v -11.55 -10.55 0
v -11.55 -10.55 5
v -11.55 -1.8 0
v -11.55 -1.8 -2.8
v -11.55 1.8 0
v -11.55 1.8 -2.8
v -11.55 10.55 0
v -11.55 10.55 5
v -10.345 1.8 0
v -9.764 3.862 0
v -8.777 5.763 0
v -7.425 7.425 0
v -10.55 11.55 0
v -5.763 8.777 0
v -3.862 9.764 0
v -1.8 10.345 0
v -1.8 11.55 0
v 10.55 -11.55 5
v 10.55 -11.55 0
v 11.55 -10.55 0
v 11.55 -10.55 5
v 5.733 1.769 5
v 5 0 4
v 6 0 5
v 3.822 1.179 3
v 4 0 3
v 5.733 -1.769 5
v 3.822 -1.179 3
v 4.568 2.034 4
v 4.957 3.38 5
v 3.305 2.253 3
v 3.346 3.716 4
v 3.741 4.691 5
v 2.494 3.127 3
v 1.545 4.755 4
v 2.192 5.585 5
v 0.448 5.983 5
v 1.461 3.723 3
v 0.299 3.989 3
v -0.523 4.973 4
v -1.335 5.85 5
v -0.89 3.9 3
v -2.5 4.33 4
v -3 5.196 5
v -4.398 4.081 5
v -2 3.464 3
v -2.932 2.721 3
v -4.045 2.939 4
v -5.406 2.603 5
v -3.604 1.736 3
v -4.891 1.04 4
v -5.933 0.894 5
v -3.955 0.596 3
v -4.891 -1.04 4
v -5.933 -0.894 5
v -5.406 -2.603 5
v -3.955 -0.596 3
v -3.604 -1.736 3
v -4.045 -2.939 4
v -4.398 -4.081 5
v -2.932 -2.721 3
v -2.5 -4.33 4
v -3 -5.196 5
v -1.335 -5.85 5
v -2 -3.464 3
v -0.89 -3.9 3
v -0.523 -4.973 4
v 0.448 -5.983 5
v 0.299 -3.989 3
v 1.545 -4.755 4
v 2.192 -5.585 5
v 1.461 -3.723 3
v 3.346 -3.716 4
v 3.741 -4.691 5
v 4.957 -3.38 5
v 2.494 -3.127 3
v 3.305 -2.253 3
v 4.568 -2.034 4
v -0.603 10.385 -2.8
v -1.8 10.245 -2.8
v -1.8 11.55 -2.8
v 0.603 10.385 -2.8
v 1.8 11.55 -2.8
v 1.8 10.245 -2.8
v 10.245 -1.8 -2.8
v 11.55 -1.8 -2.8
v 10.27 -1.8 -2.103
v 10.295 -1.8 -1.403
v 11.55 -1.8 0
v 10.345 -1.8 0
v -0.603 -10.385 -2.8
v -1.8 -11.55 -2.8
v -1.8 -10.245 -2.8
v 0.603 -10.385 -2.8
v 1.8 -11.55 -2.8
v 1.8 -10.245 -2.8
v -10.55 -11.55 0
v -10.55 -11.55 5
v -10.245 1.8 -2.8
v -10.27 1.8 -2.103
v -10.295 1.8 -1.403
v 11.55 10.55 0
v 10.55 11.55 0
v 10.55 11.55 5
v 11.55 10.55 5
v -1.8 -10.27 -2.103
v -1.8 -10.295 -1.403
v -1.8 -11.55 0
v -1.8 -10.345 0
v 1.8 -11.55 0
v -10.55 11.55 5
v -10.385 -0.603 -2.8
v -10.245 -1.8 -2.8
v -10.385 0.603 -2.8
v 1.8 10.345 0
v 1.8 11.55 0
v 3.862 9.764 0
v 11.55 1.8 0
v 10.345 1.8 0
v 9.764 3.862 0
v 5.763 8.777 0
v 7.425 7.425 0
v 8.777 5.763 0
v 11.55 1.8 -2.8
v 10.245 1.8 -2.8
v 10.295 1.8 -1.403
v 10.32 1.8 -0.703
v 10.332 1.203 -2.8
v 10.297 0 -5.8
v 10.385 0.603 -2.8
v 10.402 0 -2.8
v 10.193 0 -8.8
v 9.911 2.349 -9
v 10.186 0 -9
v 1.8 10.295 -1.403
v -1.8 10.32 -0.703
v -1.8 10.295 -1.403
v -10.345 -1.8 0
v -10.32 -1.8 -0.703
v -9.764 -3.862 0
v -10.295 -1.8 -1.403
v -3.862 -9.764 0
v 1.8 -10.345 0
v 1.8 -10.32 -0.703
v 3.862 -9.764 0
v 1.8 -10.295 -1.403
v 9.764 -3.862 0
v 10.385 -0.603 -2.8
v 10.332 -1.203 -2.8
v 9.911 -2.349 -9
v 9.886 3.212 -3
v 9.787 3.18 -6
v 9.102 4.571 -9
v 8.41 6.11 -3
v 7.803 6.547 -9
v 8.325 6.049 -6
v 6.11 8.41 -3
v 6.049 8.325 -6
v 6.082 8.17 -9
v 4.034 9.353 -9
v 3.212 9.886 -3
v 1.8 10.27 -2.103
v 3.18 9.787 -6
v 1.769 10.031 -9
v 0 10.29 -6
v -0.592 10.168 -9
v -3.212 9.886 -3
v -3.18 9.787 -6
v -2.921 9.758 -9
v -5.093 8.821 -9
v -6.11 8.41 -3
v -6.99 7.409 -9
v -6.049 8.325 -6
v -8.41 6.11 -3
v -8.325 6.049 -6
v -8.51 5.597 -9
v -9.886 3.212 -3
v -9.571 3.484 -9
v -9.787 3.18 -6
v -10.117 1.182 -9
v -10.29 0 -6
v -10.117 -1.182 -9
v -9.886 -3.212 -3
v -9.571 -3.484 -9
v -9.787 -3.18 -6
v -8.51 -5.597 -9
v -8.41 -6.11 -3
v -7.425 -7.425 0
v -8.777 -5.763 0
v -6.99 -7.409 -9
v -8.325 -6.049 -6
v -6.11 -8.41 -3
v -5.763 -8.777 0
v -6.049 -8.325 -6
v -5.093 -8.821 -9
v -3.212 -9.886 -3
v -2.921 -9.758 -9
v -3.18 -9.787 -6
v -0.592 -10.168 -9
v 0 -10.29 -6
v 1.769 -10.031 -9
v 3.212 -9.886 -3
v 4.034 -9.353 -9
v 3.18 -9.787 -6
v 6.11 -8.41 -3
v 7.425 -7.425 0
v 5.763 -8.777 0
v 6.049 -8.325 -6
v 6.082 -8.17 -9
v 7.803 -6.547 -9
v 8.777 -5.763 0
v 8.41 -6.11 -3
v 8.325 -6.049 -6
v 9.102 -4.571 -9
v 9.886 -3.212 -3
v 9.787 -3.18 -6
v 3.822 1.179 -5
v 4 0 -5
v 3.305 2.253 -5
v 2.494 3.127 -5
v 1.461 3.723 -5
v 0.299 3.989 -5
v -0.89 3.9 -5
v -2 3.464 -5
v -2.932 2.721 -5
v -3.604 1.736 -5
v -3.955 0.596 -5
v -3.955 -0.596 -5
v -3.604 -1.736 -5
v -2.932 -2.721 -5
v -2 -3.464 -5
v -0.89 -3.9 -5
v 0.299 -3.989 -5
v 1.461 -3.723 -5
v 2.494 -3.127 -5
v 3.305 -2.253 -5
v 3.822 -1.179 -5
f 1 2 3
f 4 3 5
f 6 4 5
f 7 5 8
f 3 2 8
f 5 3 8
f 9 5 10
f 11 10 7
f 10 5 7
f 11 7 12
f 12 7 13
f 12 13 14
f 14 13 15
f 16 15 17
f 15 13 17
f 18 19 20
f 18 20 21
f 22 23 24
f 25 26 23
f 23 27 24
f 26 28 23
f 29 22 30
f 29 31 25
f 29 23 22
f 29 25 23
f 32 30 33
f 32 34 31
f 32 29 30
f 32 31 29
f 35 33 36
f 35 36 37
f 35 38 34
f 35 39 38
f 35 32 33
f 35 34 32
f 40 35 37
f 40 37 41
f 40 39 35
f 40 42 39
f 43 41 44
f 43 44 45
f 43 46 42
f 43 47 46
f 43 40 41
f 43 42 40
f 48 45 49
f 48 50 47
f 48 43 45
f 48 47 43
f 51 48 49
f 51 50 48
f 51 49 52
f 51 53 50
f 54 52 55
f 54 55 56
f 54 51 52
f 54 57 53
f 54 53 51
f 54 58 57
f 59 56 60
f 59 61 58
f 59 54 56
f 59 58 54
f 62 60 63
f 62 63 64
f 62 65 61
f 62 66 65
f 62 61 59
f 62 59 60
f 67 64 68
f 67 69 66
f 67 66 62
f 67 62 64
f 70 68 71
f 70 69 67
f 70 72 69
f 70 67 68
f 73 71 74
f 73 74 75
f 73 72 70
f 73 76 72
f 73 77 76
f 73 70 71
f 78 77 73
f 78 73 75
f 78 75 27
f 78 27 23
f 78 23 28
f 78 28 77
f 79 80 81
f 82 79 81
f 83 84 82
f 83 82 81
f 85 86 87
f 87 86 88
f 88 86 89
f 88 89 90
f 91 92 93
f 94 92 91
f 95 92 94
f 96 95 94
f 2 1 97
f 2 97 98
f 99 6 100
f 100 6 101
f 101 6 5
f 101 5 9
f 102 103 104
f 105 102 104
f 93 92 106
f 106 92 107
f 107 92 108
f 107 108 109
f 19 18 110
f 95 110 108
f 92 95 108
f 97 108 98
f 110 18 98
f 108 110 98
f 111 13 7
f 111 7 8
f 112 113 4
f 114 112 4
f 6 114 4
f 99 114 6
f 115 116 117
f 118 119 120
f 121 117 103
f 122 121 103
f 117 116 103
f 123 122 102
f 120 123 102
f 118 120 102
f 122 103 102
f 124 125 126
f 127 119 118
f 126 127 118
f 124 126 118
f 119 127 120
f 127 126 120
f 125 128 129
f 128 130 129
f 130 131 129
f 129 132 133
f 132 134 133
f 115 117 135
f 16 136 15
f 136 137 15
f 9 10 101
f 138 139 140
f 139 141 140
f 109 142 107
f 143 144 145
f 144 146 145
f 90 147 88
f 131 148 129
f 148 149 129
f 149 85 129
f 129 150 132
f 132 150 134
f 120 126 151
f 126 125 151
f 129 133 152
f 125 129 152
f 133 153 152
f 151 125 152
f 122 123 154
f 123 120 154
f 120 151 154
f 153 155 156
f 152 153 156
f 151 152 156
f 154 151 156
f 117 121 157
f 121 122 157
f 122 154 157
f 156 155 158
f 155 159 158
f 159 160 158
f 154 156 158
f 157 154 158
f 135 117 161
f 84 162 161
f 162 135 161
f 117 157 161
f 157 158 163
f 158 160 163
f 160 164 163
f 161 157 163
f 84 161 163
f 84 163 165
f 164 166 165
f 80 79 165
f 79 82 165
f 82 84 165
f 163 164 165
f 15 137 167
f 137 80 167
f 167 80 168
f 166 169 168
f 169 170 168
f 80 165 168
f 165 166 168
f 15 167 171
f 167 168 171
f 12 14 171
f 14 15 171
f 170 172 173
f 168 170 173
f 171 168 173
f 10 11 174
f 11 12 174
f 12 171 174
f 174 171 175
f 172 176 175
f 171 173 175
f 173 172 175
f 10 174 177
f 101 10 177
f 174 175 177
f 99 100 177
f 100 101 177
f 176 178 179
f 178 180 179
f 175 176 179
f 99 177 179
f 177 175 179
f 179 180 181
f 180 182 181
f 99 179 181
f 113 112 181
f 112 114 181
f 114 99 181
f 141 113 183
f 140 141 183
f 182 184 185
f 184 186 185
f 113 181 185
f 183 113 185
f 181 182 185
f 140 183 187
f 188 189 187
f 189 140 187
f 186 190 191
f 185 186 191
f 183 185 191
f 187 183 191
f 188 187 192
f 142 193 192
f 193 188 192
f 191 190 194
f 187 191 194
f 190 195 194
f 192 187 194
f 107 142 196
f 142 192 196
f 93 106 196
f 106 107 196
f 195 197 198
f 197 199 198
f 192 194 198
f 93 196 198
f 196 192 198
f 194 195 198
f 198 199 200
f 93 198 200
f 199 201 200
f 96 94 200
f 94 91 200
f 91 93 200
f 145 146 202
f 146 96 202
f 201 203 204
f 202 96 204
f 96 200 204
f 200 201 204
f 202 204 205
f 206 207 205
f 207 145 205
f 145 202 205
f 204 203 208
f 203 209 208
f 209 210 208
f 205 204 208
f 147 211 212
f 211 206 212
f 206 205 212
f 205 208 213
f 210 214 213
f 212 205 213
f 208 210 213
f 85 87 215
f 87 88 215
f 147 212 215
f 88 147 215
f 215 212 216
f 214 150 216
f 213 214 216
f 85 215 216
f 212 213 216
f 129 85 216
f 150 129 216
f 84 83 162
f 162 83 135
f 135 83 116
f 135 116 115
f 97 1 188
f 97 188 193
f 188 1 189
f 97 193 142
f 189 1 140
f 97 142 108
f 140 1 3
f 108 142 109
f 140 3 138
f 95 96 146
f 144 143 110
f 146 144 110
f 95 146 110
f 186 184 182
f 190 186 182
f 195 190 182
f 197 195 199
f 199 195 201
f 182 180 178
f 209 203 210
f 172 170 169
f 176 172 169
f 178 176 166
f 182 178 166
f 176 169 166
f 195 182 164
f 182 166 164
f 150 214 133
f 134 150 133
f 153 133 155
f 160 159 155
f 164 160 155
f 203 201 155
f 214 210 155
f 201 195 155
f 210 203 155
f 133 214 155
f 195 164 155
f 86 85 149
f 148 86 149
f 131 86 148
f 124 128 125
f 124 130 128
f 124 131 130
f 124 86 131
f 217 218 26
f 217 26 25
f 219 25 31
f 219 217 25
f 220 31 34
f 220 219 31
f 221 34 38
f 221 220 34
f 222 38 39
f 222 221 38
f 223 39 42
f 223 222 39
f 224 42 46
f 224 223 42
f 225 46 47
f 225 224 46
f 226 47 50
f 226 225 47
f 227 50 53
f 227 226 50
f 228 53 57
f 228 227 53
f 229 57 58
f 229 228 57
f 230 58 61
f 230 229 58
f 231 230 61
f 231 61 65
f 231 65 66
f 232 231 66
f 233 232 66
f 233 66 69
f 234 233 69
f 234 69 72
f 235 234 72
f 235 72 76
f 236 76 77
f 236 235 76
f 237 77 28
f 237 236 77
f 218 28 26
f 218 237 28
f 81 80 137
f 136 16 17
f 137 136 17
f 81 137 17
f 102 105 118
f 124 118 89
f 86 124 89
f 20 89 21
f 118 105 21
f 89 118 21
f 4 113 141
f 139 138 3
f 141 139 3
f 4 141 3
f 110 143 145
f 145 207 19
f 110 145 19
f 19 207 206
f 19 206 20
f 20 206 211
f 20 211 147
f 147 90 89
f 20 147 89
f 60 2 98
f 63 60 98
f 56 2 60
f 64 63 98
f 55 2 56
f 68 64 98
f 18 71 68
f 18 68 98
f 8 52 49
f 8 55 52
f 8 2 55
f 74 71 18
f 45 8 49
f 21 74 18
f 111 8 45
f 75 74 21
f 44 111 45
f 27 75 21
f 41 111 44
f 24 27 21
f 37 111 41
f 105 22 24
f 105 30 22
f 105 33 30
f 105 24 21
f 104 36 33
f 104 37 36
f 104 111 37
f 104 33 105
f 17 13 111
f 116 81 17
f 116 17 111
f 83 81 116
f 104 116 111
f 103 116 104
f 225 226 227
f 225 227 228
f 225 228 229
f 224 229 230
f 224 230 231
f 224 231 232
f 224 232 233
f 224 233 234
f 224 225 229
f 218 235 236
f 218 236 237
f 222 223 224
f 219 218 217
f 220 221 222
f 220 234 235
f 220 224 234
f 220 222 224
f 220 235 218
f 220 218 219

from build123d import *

# Parameters (mm, degrees)
SKETCH011_W           = 23.1
SKETCH011_H           = 23.1
PAD007_DEPTH          = 5
PAD008_DEPTH          = 2.8
POLARPATTERN001_COUNT = 4
SKETCH013_R           = 10.5
PAD009_DEPTH          = 9
PAD009_TAPER          = 2
SKETCH014_R           = 4
POCKET003_DEPTH       = 10
CHAMFER003_SIZE       = 1
CHAMFER_SIZE          = 2


with BuildPart() as part:
    # Sketch011 → Pad007 (new body)
    with BuildSketch(Plane.XY):
        Rectangle(SKETCH011_W, SKETCH011_H)
    extrude(amount=PAD007_DEPTH)

    # Sketch012 → Pad008 (join)
    with BuildSketch(Plane.XY):
        Polygon((0, 11.55), (1.8, 11.55), (1.8, 1.8), (11.55, 1.8), (11.55, 0), (0, 0), align=None)
    pad008 = extrude(amount=-PAD008_DEPTH)

    # PolarPattern001: Pad008 ×4 about axis
    polarpattern001_axis = Axis((0, 0, 0), (0, 0, 1))
    for i in range(1, POLARPATTERN001_COUNT):
        add(pad008.rotate(polarpattern001_axis, i * 360 / POLARPATTERN001_COUNT))

    # Sketch013 → Pad009 (join)
    with BuildSketch(Plane.XY):
        Circle(SKETCH013_R)
    extrude(amount=-PAD009_DEPTH, taper=PAD009_TAPER)

    # Sketch014 → Pocket003 (cut)
    with BuildSketch(Plane.XY.offset(-5)):
        Circle(SKETCH014_R)
    extrude(amount=POCKET003_DEPTH, mode=Mode.SUBTRACT)

    # Chamfer003
    chamfer003_edges = [part.edges().sort_by_distance(p)[0] for p in [
        (-11.55, -11.55, 2.5),
        (11.55, -11.55, 2.5),
        (-11.55, 11.55, 2.5),
        (11.55, 11.55, 2.5),
    ]]
    chamfer(chamfer003_edges, length=CHAMFER003_SIZE)

    # Chamfer
    chamfer_edges = [part.edges().sort_by_distance(p)[0] for p in [
        (-4, 0, 5),
    ]]
    chamfer(chamfer_edges, length=CHAMFER_SIZE)


solid = part.part
